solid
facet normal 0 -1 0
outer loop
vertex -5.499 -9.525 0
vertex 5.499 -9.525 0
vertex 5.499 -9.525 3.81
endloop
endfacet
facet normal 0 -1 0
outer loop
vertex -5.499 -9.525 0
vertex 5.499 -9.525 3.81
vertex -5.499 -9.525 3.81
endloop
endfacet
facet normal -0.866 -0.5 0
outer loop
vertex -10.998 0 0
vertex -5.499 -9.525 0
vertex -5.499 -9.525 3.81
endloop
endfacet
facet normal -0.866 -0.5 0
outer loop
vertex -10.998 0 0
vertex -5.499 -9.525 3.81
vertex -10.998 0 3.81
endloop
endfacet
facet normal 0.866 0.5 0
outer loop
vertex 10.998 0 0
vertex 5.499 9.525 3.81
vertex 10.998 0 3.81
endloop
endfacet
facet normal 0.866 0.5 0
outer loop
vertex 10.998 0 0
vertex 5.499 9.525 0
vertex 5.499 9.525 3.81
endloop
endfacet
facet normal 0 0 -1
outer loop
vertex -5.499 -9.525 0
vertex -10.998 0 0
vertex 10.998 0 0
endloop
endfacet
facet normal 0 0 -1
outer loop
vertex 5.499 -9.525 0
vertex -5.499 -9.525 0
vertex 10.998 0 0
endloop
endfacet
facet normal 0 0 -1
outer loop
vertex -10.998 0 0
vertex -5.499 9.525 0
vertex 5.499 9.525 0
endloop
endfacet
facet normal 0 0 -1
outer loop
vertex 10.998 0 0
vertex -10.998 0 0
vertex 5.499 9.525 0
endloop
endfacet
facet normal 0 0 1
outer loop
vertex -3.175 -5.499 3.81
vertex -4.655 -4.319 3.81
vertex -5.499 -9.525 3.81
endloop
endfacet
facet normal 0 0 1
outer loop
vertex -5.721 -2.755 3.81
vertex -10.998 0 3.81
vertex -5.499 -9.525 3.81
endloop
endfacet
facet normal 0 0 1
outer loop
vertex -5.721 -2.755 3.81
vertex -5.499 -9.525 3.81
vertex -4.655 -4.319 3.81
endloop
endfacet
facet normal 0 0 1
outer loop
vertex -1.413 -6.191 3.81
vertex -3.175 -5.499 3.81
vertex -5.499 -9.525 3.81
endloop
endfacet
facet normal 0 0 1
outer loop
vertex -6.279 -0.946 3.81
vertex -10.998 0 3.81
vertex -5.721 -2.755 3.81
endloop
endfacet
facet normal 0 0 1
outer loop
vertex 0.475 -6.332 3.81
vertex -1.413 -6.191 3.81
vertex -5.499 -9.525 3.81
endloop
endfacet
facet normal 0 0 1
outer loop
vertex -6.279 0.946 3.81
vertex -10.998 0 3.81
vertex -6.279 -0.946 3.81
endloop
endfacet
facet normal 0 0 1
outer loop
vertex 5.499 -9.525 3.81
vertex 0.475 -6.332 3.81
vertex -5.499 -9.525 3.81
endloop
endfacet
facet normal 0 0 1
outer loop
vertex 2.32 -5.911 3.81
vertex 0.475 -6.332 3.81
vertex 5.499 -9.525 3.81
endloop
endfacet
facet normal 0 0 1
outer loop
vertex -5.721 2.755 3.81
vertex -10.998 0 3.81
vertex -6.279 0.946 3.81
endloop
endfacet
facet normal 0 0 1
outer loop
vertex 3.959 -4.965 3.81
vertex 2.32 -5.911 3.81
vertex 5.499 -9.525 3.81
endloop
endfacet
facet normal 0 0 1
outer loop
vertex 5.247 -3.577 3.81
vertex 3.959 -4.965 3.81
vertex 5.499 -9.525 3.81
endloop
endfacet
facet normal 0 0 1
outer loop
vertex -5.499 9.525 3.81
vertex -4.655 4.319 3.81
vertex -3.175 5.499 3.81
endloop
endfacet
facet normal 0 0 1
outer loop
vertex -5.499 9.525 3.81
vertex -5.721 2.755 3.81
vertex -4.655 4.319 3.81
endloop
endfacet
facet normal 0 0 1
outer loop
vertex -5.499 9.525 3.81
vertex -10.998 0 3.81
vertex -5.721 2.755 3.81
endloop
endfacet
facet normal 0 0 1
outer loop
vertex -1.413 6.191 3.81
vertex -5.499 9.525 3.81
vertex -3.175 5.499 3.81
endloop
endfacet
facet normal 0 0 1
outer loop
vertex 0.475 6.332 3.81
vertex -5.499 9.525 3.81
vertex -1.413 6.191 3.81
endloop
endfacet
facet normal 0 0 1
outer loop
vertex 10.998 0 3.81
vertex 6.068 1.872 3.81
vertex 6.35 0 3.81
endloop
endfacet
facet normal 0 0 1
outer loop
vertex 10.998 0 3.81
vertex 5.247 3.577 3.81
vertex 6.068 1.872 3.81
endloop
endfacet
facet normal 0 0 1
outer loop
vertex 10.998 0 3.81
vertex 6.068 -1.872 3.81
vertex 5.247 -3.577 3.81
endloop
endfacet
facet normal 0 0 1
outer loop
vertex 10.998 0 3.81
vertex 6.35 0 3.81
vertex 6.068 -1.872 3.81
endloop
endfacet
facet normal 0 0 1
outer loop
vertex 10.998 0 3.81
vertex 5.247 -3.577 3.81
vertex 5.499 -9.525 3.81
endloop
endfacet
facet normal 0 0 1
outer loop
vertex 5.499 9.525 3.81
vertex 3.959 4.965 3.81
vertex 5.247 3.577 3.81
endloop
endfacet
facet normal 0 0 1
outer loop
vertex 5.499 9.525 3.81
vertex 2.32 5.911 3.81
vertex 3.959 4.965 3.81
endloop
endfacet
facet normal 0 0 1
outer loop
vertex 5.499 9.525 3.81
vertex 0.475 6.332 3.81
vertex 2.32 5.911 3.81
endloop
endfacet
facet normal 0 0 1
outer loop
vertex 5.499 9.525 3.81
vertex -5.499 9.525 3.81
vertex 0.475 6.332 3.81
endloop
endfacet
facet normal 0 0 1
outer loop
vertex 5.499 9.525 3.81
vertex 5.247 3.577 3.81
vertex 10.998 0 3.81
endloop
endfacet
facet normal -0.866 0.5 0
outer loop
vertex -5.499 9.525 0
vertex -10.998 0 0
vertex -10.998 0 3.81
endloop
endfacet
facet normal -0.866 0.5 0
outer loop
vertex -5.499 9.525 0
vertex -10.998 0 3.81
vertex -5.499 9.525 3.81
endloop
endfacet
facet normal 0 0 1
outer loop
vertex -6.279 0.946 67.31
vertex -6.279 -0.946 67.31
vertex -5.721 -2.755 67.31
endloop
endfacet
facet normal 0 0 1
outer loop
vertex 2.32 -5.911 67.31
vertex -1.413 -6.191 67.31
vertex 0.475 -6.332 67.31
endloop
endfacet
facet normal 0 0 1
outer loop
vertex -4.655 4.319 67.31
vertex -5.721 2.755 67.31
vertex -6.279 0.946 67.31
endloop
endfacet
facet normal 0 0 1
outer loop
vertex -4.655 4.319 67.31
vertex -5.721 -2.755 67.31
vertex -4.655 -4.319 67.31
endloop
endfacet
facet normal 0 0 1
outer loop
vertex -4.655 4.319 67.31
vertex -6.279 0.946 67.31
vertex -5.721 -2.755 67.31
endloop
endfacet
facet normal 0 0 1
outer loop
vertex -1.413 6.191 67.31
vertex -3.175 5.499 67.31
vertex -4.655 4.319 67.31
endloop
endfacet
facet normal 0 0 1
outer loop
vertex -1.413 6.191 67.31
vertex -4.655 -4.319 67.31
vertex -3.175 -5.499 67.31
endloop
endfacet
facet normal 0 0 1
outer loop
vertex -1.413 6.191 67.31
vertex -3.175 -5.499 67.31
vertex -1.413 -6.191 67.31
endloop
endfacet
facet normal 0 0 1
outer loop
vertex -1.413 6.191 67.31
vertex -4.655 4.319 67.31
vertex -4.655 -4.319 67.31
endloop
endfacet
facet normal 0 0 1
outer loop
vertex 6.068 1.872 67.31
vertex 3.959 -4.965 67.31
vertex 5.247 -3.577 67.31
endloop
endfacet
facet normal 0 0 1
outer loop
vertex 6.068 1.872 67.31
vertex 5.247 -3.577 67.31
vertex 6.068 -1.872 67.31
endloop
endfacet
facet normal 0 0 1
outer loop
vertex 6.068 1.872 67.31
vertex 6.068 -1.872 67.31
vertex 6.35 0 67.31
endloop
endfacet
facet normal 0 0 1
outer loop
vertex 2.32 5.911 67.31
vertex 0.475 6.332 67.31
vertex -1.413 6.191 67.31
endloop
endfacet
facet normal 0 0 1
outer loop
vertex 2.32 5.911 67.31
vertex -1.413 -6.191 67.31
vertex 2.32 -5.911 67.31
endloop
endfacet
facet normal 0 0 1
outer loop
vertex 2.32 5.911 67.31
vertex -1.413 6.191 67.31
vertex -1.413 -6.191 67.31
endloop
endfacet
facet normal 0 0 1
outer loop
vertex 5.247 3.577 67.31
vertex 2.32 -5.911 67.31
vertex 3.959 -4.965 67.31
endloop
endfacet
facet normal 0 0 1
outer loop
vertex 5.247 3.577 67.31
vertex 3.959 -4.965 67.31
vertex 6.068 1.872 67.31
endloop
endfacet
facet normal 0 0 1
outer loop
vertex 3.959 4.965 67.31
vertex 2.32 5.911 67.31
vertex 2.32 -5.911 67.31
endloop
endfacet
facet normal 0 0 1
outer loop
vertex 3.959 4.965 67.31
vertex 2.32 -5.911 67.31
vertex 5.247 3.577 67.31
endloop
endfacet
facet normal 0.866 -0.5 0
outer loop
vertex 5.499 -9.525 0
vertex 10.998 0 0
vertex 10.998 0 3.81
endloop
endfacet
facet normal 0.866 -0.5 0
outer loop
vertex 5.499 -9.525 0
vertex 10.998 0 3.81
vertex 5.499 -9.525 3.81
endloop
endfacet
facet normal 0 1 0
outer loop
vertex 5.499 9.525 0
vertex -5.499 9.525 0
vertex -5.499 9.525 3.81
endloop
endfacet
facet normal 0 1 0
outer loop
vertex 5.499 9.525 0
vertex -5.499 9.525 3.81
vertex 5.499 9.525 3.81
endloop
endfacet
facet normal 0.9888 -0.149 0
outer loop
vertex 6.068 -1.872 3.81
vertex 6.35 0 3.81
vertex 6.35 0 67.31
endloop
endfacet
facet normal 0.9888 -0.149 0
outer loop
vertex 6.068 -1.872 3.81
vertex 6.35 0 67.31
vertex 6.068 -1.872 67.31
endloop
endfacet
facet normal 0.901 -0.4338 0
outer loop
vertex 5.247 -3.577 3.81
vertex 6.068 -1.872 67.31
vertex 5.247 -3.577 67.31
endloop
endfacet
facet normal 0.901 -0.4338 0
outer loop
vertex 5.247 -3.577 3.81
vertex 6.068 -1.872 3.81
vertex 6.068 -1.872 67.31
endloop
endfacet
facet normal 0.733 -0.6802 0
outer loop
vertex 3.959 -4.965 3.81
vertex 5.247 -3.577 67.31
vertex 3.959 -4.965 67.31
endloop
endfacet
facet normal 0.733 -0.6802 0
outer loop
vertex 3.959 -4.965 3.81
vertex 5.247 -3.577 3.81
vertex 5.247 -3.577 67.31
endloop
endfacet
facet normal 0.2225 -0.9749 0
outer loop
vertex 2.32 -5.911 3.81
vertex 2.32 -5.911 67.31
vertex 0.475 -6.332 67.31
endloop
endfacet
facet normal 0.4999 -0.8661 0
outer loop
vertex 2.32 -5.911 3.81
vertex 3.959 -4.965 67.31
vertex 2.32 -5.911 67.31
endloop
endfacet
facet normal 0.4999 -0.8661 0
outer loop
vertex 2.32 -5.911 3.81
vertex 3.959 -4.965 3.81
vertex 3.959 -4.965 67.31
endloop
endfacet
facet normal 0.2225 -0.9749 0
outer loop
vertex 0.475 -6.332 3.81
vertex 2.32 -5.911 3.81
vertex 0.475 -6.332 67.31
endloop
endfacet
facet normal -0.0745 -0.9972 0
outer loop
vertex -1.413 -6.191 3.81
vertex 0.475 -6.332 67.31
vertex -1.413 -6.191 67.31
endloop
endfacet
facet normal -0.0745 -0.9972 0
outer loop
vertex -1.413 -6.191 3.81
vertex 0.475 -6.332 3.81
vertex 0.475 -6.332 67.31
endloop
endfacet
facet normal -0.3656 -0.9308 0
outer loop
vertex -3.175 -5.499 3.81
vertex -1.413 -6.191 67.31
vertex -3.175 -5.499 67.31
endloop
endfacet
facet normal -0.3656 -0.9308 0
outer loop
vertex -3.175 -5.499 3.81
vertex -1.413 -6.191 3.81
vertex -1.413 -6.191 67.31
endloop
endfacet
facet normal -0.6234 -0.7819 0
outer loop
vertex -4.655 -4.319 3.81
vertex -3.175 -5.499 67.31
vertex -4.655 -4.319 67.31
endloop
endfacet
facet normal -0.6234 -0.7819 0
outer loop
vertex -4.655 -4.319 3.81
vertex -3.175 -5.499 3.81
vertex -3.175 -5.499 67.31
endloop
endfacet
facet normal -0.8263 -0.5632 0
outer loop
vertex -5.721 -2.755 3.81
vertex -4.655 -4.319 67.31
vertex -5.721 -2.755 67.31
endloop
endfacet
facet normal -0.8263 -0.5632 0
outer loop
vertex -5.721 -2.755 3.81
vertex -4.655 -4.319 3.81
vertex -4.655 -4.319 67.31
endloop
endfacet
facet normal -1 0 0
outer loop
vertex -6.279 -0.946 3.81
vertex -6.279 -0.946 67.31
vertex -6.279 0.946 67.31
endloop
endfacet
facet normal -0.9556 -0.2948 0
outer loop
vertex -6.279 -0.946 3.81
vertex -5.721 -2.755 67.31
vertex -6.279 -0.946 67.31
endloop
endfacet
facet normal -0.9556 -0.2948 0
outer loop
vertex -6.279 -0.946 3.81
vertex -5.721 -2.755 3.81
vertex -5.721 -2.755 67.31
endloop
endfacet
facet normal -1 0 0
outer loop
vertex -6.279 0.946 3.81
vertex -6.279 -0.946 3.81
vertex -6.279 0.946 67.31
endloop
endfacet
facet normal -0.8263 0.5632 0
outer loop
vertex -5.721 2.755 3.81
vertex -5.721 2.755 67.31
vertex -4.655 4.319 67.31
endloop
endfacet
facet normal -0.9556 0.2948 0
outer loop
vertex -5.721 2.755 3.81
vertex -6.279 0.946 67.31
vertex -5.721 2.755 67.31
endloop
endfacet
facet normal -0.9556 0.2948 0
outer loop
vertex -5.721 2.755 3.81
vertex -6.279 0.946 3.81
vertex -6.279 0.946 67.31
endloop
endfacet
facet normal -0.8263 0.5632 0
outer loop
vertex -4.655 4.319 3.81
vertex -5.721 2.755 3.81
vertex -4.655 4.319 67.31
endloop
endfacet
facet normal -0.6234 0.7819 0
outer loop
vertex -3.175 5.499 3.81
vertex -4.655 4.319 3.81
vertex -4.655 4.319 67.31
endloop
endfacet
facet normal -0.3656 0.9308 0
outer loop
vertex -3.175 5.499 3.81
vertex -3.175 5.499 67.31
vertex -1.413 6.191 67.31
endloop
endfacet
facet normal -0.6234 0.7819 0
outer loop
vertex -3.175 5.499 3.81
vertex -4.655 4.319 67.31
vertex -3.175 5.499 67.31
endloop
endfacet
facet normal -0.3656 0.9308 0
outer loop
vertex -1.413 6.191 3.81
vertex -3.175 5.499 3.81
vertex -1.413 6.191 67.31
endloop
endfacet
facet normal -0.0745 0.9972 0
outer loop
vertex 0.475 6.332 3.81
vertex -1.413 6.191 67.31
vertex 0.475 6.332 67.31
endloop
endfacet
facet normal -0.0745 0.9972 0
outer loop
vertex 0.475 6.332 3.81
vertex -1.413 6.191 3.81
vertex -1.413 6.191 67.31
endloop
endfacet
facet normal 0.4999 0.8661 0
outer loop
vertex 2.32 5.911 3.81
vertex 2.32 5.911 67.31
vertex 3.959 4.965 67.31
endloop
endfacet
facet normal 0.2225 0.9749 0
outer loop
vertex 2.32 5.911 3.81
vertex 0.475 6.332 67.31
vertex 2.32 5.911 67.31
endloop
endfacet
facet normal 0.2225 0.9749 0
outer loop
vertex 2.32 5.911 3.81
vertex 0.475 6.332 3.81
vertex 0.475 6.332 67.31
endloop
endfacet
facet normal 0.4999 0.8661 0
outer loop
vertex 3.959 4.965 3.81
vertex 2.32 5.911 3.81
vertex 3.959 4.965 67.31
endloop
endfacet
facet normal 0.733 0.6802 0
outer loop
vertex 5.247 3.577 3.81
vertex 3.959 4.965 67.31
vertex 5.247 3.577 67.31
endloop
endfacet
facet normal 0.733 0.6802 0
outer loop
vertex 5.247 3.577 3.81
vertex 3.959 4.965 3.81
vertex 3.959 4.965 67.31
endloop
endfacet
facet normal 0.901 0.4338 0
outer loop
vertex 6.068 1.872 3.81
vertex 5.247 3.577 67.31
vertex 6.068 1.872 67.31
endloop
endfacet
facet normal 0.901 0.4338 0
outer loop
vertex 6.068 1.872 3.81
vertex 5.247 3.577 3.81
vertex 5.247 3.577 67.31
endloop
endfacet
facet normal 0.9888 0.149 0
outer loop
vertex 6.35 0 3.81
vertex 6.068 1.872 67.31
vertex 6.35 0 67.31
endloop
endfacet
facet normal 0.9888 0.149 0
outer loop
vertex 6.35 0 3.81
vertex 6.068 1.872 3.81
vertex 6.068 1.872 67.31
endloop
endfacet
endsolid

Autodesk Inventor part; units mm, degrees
ref_plane "YZ Plane" through (0, 0, 0) normal (1, 0, 0) x (0, 1, 0)
ref_plane "XZ Plane" through (0, 0, 0) normal (0, 1, 0) x (-1, 0, 0)
ref_plane "XY Plane" through (0, 0, 0) normal (0, 0, 1) x (1, 0, 0)
sketch "Sketch1" plane through (0, 0, 0) normal (0, 0, 1) x (1, 0, 0)
  line L0 (-10.9985, 0) -> (-5.4993, 9.525)
  line L1 (-5.4993, 9.525) -> (5.4993, 9.525)
  line L2 (5.4993, 9.525) -> (10.9985, 0)
  line L3 (10.9985, 0) -> (5.4993, -9.525)
  line L4 (5.4993, -9.525) -> (-5.4993, -9.525)
  line L5 (-5.4993, -9.525) -> (-10.9985, 0)
  point P0 (0, 0)
  point P1 (0, 0)
  dimension "d0" = 19.05
extrude "Extrusion1" add sketch "Sketch1" along normal blind 3.81
sketch "Sketch2" plane through (0, 0, 3.81) normal (0, 0, 1) x (1, 0, 0)
  circle A0 centre (0, 0) radius 6.35
  dimension "d3" = 12.7
extrude "Extrusion2" add sketch "Sketch2" along normal blind 63.5
thread "Thread1" size "1/2-13 UNC" class "2A" standard "ANSI Unified Screw Threads" full length
properties part number "LucasCharles Part 4 bolt to hold arm to wall mount Final" material "Stainless Steel, Austenitic"
